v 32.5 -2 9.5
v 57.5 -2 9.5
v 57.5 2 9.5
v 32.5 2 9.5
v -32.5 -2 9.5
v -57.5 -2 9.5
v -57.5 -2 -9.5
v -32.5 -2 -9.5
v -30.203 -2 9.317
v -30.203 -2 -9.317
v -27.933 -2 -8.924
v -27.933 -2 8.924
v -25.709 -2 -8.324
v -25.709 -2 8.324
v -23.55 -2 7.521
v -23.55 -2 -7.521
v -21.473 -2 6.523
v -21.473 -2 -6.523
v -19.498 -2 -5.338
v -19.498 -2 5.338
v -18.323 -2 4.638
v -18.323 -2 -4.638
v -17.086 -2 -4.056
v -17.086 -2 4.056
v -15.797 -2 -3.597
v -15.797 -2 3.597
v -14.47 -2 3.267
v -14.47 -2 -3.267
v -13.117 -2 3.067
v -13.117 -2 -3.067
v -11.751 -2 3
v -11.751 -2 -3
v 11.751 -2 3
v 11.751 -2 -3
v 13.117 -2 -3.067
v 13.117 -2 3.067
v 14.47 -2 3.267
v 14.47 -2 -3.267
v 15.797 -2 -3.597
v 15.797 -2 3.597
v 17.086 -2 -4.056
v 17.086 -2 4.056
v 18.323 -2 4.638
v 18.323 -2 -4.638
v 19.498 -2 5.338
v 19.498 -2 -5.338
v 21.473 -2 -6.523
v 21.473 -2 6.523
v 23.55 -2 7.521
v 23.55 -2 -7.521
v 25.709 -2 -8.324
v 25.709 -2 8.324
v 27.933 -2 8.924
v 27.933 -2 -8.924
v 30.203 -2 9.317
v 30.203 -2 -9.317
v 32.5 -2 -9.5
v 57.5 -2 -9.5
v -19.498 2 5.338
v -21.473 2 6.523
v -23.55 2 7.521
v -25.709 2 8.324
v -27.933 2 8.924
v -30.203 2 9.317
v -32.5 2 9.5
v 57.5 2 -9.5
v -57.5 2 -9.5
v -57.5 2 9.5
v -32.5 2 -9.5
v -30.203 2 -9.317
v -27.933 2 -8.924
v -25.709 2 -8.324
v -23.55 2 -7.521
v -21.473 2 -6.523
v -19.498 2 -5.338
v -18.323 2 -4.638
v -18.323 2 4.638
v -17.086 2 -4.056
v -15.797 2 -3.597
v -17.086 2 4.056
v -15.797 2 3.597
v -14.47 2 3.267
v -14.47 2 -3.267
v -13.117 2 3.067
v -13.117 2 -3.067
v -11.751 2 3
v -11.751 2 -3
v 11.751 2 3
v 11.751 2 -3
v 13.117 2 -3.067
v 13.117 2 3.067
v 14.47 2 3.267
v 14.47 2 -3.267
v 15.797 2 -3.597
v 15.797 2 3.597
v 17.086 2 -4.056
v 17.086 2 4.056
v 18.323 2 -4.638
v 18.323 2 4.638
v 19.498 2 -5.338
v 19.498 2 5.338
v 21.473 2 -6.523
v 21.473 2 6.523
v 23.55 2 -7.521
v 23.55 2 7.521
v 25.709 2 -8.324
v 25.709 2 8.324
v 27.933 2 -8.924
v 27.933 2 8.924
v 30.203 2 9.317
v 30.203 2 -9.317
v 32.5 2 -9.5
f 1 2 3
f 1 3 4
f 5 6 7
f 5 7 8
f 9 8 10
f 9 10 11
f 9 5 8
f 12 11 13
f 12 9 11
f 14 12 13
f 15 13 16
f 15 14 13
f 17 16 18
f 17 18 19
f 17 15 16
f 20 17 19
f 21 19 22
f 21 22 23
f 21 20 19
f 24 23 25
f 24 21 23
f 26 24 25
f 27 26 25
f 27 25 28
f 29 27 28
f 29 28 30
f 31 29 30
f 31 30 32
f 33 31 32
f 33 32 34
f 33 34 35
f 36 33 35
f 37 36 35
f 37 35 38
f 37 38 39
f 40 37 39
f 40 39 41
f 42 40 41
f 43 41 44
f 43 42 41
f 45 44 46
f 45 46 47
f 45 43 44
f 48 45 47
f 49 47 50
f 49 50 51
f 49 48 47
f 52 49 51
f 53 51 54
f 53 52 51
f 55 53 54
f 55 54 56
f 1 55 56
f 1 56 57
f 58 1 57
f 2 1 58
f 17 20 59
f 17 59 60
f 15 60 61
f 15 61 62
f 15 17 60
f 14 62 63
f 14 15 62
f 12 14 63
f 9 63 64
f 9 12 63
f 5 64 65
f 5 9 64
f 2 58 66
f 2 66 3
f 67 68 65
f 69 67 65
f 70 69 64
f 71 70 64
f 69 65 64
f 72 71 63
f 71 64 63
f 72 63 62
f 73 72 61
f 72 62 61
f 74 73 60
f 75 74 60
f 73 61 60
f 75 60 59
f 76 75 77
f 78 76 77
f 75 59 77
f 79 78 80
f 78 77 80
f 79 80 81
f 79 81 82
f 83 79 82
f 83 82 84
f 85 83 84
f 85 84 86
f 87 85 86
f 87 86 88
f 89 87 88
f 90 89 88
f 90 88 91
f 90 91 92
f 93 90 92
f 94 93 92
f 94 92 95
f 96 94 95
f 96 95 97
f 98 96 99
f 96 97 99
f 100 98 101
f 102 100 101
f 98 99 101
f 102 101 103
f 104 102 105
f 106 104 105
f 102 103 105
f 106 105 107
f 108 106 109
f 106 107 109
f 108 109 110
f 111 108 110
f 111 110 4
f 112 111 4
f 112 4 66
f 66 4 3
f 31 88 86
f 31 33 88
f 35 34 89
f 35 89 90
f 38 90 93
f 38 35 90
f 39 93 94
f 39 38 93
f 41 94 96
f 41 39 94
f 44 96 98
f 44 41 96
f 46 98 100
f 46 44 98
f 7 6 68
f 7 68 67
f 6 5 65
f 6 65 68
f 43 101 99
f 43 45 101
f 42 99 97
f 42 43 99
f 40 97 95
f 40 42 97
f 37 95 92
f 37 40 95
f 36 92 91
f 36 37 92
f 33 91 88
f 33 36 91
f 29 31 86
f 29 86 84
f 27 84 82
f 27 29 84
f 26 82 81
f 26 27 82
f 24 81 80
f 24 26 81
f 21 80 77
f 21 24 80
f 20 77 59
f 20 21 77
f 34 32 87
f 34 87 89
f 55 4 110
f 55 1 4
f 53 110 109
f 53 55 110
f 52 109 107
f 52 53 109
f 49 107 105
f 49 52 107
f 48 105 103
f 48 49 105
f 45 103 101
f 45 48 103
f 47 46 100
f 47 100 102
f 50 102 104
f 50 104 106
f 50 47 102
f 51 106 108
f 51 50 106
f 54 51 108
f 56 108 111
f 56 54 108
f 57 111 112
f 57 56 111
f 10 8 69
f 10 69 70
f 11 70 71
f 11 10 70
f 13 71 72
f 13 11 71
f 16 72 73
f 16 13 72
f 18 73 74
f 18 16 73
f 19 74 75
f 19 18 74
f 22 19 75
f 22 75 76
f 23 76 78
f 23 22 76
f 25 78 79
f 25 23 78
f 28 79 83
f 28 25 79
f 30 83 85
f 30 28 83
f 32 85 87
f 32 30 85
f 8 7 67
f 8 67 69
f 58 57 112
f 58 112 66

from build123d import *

# Parameters (mm, degrees)
F1_DEPTH = 2


with BuildPart() as f1:
    # F0 (on Front) → F1 (new body, symmetric)
    with BuildSketch(Plane.XZ):
        with BuildLine():
            Line((11.751494, 3), (0, 3))
            Line((0, 3), (-11.751494, 3))
            ThreePointArc((-11.751494, 3), (-15.797231, 3.597313), (-19.497744, 5.338285))
            ThreePointArc((-19.497744, 5.338285), (-25.709291, 8.323868), (-32.5, 9.5))
            Line((-32.5, 9.5), (-57.5, 9.5))
            Line((-57.5, 9.5), (-57.5, -9.5))
            Line((-57.5, -9.5), (-32.5, -9.5))
            ThreePointArc((-32.5, -9.5), (-25.709291, -8.323868), (-19.497744, -5.338285))
            ThreePointArc((-19.497744, -5.338285), (-15.797231, -3.597313), (-11.751494, -3))
            Line((-11.751494, -3), (0, -3))
            Line((0, -3), (11.751494, -3))
            ThreePointArc((11.751494, -3), (15.797231, -3.597313), (19.497744, -5.338285))
            ThreePointArc((19.497744, -5.338285), (25.709291, -8.323868), (32.5, -9.5))
            Line((32.5, -9.5), (57.5, -9.5))
            Line((57.5, -9.5), (57.5, 9.5))
            Line((57.5, 9.5), (32.5, 9.5))
            ThreePointArc((32.5, 9.5), (25.709291, 8.323868), (19.497744, 5.338285))
            ThreePointArc((19.497744, 5.338285), (15.797231, 3.597313), (11.751494, 3))
        make_face()
    extrude(amount=F1_DEPTH, both=True)


solid = f1.part
